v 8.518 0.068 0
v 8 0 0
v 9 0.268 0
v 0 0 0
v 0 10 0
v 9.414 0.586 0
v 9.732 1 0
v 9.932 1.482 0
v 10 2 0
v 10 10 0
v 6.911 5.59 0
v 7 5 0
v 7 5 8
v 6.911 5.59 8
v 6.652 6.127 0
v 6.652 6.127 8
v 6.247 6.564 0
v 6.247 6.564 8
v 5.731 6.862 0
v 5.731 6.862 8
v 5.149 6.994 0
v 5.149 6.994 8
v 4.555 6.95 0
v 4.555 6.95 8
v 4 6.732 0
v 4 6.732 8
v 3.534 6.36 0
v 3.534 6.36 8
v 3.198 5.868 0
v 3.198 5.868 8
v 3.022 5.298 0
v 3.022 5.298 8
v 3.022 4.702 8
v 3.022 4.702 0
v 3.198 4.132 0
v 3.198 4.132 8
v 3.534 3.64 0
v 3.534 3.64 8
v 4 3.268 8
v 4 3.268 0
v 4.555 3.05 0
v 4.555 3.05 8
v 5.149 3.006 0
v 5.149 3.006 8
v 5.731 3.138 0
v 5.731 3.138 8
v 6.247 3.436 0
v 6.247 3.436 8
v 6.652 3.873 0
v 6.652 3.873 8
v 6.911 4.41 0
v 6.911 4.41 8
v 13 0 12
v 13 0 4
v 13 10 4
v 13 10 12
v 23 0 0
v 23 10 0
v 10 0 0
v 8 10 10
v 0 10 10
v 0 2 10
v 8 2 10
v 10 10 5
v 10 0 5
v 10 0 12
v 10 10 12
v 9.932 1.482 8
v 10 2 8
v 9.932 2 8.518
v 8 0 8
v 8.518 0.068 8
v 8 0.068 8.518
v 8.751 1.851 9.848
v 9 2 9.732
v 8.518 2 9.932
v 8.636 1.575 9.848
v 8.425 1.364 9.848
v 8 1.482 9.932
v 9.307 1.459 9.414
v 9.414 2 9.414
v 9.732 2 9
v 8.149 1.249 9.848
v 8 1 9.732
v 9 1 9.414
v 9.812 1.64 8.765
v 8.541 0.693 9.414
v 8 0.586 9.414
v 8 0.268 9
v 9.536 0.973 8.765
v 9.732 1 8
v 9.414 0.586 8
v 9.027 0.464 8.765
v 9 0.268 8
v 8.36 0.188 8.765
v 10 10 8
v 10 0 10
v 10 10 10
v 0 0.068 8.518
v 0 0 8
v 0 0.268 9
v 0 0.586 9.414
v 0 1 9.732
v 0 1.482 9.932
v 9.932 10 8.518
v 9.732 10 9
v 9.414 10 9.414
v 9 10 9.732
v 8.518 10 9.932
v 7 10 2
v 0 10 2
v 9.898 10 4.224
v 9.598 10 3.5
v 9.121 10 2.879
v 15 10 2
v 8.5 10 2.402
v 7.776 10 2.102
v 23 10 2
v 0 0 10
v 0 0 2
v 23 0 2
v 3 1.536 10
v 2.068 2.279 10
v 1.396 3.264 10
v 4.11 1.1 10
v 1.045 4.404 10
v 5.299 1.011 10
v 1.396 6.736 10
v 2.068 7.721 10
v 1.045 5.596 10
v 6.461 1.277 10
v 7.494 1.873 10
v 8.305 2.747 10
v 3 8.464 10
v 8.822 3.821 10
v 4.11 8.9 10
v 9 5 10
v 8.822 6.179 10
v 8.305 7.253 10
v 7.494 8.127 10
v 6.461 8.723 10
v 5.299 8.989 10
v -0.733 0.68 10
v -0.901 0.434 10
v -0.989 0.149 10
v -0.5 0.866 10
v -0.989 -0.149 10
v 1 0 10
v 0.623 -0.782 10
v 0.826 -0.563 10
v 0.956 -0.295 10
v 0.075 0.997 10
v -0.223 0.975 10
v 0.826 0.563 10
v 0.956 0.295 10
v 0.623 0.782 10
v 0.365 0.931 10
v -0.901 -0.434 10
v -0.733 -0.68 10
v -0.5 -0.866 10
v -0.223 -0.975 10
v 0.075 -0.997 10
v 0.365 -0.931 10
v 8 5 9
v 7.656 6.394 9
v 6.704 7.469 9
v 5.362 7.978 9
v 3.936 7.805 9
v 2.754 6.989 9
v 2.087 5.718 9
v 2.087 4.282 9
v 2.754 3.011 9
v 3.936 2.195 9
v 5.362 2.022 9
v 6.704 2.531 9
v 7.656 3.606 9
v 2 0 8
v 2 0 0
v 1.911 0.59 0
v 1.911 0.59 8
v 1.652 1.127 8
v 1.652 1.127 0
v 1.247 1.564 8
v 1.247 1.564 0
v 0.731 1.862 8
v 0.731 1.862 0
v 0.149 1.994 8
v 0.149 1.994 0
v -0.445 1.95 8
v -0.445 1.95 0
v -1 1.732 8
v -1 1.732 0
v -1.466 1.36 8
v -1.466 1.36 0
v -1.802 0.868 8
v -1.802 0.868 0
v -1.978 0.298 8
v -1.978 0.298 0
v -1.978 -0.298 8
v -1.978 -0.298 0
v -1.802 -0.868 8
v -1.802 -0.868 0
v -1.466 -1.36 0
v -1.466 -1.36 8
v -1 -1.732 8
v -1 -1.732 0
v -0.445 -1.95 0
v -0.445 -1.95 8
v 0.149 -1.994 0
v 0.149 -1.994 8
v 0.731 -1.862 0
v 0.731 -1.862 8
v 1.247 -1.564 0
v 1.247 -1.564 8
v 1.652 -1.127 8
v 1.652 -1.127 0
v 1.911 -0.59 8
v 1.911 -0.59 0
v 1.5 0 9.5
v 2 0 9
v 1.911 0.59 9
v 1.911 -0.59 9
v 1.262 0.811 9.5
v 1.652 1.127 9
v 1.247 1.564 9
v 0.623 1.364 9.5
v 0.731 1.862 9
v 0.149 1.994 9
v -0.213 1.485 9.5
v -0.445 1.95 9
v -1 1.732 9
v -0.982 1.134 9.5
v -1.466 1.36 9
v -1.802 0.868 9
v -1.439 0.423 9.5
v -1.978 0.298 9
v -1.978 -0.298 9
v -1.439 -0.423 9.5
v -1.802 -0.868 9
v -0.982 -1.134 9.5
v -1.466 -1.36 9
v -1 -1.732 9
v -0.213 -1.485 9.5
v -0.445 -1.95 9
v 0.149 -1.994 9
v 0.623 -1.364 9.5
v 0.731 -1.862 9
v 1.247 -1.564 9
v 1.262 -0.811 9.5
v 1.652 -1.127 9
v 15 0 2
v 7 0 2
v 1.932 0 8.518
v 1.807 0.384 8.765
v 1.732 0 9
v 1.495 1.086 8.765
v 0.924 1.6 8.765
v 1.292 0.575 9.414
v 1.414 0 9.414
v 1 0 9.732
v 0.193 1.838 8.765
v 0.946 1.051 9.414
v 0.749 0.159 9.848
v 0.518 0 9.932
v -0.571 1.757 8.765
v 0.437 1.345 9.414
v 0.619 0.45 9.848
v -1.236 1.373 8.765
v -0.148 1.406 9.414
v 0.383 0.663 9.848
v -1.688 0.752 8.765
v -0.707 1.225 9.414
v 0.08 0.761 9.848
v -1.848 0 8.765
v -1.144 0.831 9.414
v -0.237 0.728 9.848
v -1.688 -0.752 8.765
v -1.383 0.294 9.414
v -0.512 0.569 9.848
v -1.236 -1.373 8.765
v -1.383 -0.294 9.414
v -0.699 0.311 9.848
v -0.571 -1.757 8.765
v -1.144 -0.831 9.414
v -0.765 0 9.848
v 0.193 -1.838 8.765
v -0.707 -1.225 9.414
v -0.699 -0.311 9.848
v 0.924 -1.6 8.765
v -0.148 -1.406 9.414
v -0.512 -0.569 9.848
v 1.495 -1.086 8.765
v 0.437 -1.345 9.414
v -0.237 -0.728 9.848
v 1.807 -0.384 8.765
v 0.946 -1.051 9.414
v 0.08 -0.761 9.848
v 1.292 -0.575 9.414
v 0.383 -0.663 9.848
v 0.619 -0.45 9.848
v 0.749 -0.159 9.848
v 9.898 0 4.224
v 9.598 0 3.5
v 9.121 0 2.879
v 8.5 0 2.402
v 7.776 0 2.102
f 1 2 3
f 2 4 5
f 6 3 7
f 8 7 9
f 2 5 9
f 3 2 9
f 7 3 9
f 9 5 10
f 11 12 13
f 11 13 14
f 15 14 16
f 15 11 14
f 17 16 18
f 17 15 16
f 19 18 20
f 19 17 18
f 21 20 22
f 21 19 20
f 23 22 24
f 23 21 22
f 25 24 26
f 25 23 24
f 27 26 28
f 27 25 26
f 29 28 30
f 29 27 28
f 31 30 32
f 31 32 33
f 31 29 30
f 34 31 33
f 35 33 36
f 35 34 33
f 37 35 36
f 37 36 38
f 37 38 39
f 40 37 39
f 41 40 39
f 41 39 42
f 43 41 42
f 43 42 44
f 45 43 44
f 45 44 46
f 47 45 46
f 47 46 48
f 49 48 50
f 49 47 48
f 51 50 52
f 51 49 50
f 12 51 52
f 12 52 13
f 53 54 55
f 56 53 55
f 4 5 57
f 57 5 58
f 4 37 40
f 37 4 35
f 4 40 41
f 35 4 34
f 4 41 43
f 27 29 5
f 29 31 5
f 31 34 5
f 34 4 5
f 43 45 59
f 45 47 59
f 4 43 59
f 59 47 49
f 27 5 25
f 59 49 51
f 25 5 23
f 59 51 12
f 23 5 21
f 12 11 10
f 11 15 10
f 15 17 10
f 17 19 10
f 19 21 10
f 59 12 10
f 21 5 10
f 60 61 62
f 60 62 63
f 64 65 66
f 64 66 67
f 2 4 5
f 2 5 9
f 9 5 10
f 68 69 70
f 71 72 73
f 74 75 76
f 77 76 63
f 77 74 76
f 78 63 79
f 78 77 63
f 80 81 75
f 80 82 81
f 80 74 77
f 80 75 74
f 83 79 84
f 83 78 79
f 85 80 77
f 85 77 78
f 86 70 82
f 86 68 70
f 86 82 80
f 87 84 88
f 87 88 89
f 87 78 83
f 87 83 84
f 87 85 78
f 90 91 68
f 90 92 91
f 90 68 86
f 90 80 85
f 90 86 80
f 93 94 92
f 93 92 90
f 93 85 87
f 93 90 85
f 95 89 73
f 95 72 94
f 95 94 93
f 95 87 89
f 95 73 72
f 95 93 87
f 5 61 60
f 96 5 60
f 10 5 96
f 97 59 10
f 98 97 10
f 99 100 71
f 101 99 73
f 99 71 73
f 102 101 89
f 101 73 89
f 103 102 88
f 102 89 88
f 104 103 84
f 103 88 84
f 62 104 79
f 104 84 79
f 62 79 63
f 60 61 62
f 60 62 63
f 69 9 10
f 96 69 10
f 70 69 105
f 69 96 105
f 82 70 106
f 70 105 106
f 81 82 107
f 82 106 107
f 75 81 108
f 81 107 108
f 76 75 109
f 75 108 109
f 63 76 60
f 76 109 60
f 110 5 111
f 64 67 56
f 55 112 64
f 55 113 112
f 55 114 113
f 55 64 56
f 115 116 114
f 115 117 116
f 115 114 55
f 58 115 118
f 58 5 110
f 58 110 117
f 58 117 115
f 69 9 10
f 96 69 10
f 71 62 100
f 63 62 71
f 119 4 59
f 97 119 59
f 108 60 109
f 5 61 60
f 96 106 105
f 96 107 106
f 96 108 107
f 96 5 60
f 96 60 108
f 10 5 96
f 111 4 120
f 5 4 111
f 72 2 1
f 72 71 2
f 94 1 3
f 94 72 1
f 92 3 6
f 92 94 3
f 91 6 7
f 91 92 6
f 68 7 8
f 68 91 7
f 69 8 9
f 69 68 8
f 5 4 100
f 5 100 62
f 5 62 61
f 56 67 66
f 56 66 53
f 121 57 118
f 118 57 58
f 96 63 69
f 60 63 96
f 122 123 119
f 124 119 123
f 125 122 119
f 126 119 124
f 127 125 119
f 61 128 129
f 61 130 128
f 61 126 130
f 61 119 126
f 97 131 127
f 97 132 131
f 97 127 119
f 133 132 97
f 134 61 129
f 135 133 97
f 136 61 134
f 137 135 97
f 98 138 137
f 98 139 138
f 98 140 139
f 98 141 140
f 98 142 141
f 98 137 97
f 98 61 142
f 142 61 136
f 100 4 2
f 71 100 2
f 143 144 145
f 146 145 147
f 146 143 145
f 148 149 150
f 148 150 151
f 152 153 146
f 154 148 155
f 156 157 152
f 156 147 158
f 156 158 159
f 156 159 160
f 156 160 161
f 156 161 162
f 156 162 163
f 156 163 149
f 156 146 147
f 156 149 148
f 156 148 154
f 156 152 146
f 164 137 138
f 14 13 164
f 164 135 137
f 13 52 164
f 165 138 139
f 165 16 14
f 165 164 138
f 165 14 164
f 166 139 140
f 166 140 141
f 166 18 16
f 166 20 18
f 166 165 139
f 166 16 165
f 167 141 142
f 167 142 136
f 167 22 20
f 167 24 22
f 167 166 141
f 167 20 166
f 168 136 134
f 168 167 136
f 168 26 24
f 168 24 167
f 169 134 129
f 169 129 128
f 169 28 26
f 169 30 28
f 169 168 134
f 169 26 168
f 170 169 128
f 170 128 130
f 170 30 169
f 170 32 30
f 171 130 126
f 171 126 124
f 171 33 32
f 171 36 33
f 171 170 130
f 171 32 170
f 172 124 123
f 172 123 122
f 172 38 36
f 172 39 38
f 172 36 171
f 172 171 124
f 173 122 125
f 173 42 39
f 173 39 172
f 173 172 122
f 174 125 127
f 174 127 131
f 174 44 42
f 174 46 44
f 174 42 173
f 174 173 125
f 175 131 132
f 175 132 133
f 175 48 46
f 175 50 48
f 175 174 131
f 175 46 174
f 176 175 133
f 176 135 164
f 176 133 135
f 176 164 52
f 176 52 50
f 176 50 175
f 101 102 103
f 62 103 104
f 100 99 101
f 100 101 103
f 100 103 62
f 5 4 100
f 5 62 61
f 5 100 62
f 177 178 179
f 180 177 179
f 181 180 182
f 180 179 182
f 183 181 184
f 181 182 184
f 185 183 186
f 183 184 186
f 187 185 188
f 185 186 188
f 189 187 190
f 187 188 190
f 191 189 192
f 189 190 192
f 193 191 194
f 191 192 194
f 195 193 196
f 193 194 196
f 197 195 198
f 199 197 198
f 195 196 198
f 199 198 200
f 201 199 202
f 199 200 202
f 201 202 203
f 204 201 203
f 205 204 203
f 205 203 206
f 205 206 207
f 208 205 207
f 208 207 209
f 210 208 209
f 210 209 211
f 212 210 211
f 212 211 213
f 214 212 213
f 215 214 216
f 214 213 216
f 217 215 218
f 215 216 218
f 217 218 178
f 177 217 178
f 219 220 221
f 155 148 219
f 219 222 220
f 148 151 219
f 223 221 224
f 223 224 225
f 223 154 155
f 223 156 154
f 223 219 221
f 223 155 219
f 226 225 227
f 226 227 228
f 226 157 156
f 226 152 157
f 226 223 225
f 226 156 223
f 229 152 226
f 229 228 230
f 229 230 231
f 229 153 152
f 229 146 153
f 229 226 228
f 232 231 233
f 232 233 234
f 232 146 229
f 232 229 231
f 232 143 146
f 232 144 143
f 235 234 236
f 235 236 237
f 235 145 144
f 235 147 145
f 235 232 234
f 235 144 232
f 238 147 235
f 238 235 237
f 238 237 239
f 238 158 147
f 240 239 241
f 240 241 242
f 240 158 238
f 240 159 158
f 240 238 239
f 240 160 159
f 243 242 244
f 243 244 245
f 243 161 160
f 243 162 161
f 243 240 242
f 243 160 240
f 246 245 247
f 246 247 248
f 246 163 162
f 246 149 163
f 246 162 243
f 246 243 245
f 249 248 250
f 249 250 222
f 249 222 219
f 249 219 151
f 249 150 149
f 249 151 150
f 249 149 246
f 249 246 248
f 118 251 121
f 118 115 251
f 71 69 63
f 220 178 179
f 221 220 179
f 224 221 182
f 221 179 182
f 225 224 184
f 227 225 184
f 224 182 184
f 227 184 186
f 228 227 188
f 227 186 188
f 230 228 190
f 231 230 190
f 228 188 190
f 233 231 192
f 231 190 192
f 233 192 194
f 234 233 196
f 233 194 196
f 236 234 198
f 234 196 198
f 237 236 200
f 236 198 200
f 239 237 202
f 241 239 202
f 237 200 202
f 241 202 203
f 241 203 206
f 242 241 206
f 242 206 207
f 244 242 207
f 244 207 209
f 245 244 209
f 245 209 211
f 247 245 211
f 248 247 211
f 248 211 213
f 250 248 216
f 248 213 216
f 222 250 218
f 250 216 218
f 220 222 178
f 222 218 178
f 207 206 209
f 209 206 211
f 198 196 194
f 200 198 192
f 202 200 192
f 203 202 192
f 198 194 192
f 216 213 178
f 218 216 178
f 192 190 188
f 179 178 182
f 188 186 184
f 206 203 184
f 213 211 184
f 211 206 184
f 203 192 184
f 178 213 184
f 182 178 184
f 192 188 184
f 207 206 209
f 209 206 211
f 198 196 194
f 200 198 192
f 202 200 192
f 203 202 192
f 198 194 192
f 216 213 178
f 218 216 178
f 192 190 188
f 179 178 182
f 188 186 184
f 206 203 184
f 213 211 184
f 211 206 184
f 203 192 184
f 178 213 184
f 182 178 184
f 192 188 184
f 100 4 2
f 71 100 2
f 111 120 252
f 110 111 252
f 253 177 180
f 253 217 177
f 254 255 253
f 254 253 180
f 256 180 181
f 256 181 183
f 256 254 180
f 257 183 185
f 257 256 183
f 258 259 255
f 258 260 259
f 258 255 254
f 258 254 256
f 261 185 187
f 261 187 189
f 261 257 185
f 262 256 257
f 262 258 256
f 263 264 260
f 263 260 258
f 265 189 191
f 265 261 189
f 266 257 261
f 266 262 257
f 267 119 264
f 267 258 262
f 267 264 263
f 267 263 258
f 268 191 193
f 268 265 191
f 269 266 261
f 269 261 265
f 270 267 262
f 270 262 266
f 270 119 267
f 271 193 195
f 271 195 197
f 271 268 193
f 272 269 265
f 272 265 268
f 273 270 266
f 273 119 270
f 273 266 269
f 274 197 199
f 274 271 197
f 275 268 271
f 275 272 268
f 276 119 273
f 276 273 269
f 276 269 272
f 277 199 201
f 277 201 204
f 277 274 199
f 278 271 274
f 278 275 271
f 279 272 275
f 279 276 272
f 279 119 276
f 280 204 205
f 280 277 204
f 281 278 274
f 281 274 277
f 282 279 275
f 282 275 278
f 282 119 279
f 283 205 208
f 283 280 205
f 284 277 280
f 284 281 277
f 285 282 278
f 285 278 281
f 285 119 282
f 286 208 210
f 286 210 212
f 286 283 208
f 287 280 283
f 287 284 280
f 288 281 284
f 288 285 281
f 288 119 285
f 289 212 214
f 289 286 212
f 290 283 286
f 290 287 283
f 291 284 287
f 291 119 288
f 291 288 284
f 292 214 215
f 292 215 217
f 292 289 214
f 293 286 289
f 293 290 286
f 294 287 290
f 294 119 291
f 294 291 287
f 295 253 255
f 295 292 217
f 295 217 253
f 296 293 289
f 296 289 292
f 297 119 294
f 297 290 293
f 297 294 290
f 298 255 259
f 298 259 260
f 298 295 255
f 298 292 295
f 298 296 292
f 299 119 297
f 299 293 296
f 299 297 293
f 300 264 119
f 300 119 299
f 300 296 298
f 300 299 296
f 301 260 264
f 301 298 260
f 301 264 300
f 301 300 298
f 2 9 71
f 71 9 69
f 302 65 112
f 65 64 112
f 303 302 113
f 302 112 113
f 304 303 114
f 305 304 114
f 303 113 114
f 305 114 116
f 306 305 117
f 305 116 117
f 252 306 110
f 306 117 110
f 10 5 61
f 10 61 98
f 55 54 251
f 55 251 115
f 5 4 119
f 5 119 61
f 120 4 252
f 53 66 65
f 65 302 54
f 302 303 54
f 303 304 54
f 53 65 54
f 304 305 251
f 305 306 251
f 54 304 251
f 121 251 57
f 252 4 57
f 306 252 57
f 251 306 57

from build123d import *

# Parameters (mm, degrees)
BOX_W             = 10
BOX_H             = 10
BOX_DEPTH         = 10
FILLET_R          = 2
BOX001_W          = 10
BOX001_H          = 10
BOX001_DEPTH      = 10
CHAMFER_SIZE      = 2
CYLINDER_R        = 2
CYLINDER_DEPTH    = 10
BOX002_W          = 10
BOX002_H          = 10
BOX002_DEPTH      = 10
CHAMFER001_SIZE   = 2
CYLINDER001_R     = 2
CYLINDER001_DEPTH = 10
FILLET001_R       = 2
CYLINDER002_R     = 2
CYLINDER002_DEPTH = 10
CHAMFER002_SIZE   = 1
BOX005_W          = 10
BOX005_H          = 10
BOX005_DEPTH      = 10
BOX004_W          = 10
BOX004_H          = 10
BOX004_DEPTH      = 10
BOX003_W          = 23
BOX003_H          = 10
BOX003_DEPTH      = 12
CHAMFER003_SIZE   = 2
FILLET002_R       = 3


with BuildPart() as fillet_body:
    # Box → Box (new body)
    with BuildSketch(Plane.XY):
        with Locations((5, 5)):
            Rectangle(BOX_W, BOX_H)
    extrude(amount=BOX_DEPTH)

    # Fillet
    fillet_edges = [fillet_body.edges().sort_by_distance(p)[0] for p in [
        (10, 0, 5),
        (10, 5, 10),
        (5, 0, 10),
    ]]
    fillet(fillet_edges, radius=FILLET_R)


with BuildPart() as chamfer_body:
    # Box001 → Box001 (new body)
    with BuildSketch(Plane.XY):
        with Locations((5, 5)):
            Rectangle(BOX001_W, BOX001_H)
    extrude(amount=BOX001_DEPTH)

    # Chamfer
    chamfer_edges = [chamfer_body.edges().sort_by_distance(p)[0] for p in [
        (10, 0, 5),
        (10, 5, 10),
        (5, 0, 10),
    ]]
    chamfer(chamfer_edges, length=CHAMFER_SIZE)


with BuildPart() as cilindro:
    # Cylinder → Cylinder (new body)
    with BuildSketch(Plane(origin=(5, 5, 0), x_dir=(1, 0, 0), z_dir=(0, 0, 1))):
        Circle(CYLINDER_R)
    extrude(amount=CYLINDER_DEPTH)


with BuildPart() as chamfer001:
    # Box002 → Box002 (new body)
    with BuildSketch(Plane.XY):
        with Locations((5, 5)):
            Rectangle(BOX002_W, BOX002_H)
    extrude(amount=BOX002_DEPTH)

    # Cut: cut Cilindro
    add(cilindro.part, mode=Mode.SUBTRACT)

    # Chamfer001
    chamfer001_edges = [chamfer001.edges().sort_by_distance(p)[0] for p in [
        (3, 5, 10),
    ]]
    chamfer(chamfer001_edges, length=CHAMFER001_SIZE)


with BuildPart() as fillet001:
    # Cylinder001 → Cylinder001 (new body)
    with BuildSketch(Plane.XY):
        Circle(CYLINDER001_R)
    extrude(amount=CYLINDER001_DEPTH)

    # Fillet001
    fillet001_edges = [fillet001.edges().sort_by_distance(p)[0] for p in [
        (-2, 0, 10),
    ]]
    fillet(fillet001_edges, radius=FILLET001_R)


with BuildPart() as chamfer002:
    # Cylinder002 → Cylinder002 (new body)
    with BuildSketch(Plane.XY):
        Circle(CYLINDER002_R)
    extrude(amount=CYLINDER002_DEPTH)

    # Chamfer002
    chamfer002_edges = [chamfer002.edges().sort_by_distance(p)[0] for p in [
        (-2, 0, 10),
    ]]
    chamfer(chamfer002_edges, length=CHAMFER002_SIZE)


with BuildPart() as cubo005:
    # Box005 → Box005 (new body)
    with BuildSketch(Plane(origin=(13, 0, 2), x_dir=(1, 0, 0), z_dir=(0, 0, 1))):
        with Locations((5, 5)):
            Rectangle(BOX005_W, BOX005_H)
    extrude(amount=BOX005_DEPTH)


with BuildPart() as fusion:
    # Box004 → Box004 (new body)
    with BuildSketch(Plane.XY.offset(2)):
        with Locations((5, 5)):
            Rectangle(BOX004_W, BOX004_H)
    extrude(amount=BOX004_DEPTH)

    # Fusion: union Cubo005
    add(cubo005.part)


with BuildPart() as fillet002:
    # Box003 → Box003 (new body)
    with BuildSketch(Plane.XY):
        with Locations((11.5, 5)):
            Rectangle(BOX003_W, BOX003_H)
    extrude(amount=BOX003_DEPTH)

    # Cut001: cut Fusion
    add(fusion.part, mode=Mode.SUBTRACT)

    # Chamfer003
    chamfer003_edges = [fillet002.edges().sort_by_distance(p)[0] for p in [
        (13, 5, 2),
    ]]
    chamfer(chamfer003_edges, length=CHAMFER003_SIZE)

    # Fillet002
    fillet002_edges = [fillet002.edges().sort_by_distance(p)[0] for p in [
        (10, 5, 2),
    ]]
    fillet(fillet002_edges, radius=FILLET002_R)


solid = Compound([fillet_body.part, chamfer_body.part, chamfer001.part, fillet001.part, chamfer002.part, fillet002.part])
